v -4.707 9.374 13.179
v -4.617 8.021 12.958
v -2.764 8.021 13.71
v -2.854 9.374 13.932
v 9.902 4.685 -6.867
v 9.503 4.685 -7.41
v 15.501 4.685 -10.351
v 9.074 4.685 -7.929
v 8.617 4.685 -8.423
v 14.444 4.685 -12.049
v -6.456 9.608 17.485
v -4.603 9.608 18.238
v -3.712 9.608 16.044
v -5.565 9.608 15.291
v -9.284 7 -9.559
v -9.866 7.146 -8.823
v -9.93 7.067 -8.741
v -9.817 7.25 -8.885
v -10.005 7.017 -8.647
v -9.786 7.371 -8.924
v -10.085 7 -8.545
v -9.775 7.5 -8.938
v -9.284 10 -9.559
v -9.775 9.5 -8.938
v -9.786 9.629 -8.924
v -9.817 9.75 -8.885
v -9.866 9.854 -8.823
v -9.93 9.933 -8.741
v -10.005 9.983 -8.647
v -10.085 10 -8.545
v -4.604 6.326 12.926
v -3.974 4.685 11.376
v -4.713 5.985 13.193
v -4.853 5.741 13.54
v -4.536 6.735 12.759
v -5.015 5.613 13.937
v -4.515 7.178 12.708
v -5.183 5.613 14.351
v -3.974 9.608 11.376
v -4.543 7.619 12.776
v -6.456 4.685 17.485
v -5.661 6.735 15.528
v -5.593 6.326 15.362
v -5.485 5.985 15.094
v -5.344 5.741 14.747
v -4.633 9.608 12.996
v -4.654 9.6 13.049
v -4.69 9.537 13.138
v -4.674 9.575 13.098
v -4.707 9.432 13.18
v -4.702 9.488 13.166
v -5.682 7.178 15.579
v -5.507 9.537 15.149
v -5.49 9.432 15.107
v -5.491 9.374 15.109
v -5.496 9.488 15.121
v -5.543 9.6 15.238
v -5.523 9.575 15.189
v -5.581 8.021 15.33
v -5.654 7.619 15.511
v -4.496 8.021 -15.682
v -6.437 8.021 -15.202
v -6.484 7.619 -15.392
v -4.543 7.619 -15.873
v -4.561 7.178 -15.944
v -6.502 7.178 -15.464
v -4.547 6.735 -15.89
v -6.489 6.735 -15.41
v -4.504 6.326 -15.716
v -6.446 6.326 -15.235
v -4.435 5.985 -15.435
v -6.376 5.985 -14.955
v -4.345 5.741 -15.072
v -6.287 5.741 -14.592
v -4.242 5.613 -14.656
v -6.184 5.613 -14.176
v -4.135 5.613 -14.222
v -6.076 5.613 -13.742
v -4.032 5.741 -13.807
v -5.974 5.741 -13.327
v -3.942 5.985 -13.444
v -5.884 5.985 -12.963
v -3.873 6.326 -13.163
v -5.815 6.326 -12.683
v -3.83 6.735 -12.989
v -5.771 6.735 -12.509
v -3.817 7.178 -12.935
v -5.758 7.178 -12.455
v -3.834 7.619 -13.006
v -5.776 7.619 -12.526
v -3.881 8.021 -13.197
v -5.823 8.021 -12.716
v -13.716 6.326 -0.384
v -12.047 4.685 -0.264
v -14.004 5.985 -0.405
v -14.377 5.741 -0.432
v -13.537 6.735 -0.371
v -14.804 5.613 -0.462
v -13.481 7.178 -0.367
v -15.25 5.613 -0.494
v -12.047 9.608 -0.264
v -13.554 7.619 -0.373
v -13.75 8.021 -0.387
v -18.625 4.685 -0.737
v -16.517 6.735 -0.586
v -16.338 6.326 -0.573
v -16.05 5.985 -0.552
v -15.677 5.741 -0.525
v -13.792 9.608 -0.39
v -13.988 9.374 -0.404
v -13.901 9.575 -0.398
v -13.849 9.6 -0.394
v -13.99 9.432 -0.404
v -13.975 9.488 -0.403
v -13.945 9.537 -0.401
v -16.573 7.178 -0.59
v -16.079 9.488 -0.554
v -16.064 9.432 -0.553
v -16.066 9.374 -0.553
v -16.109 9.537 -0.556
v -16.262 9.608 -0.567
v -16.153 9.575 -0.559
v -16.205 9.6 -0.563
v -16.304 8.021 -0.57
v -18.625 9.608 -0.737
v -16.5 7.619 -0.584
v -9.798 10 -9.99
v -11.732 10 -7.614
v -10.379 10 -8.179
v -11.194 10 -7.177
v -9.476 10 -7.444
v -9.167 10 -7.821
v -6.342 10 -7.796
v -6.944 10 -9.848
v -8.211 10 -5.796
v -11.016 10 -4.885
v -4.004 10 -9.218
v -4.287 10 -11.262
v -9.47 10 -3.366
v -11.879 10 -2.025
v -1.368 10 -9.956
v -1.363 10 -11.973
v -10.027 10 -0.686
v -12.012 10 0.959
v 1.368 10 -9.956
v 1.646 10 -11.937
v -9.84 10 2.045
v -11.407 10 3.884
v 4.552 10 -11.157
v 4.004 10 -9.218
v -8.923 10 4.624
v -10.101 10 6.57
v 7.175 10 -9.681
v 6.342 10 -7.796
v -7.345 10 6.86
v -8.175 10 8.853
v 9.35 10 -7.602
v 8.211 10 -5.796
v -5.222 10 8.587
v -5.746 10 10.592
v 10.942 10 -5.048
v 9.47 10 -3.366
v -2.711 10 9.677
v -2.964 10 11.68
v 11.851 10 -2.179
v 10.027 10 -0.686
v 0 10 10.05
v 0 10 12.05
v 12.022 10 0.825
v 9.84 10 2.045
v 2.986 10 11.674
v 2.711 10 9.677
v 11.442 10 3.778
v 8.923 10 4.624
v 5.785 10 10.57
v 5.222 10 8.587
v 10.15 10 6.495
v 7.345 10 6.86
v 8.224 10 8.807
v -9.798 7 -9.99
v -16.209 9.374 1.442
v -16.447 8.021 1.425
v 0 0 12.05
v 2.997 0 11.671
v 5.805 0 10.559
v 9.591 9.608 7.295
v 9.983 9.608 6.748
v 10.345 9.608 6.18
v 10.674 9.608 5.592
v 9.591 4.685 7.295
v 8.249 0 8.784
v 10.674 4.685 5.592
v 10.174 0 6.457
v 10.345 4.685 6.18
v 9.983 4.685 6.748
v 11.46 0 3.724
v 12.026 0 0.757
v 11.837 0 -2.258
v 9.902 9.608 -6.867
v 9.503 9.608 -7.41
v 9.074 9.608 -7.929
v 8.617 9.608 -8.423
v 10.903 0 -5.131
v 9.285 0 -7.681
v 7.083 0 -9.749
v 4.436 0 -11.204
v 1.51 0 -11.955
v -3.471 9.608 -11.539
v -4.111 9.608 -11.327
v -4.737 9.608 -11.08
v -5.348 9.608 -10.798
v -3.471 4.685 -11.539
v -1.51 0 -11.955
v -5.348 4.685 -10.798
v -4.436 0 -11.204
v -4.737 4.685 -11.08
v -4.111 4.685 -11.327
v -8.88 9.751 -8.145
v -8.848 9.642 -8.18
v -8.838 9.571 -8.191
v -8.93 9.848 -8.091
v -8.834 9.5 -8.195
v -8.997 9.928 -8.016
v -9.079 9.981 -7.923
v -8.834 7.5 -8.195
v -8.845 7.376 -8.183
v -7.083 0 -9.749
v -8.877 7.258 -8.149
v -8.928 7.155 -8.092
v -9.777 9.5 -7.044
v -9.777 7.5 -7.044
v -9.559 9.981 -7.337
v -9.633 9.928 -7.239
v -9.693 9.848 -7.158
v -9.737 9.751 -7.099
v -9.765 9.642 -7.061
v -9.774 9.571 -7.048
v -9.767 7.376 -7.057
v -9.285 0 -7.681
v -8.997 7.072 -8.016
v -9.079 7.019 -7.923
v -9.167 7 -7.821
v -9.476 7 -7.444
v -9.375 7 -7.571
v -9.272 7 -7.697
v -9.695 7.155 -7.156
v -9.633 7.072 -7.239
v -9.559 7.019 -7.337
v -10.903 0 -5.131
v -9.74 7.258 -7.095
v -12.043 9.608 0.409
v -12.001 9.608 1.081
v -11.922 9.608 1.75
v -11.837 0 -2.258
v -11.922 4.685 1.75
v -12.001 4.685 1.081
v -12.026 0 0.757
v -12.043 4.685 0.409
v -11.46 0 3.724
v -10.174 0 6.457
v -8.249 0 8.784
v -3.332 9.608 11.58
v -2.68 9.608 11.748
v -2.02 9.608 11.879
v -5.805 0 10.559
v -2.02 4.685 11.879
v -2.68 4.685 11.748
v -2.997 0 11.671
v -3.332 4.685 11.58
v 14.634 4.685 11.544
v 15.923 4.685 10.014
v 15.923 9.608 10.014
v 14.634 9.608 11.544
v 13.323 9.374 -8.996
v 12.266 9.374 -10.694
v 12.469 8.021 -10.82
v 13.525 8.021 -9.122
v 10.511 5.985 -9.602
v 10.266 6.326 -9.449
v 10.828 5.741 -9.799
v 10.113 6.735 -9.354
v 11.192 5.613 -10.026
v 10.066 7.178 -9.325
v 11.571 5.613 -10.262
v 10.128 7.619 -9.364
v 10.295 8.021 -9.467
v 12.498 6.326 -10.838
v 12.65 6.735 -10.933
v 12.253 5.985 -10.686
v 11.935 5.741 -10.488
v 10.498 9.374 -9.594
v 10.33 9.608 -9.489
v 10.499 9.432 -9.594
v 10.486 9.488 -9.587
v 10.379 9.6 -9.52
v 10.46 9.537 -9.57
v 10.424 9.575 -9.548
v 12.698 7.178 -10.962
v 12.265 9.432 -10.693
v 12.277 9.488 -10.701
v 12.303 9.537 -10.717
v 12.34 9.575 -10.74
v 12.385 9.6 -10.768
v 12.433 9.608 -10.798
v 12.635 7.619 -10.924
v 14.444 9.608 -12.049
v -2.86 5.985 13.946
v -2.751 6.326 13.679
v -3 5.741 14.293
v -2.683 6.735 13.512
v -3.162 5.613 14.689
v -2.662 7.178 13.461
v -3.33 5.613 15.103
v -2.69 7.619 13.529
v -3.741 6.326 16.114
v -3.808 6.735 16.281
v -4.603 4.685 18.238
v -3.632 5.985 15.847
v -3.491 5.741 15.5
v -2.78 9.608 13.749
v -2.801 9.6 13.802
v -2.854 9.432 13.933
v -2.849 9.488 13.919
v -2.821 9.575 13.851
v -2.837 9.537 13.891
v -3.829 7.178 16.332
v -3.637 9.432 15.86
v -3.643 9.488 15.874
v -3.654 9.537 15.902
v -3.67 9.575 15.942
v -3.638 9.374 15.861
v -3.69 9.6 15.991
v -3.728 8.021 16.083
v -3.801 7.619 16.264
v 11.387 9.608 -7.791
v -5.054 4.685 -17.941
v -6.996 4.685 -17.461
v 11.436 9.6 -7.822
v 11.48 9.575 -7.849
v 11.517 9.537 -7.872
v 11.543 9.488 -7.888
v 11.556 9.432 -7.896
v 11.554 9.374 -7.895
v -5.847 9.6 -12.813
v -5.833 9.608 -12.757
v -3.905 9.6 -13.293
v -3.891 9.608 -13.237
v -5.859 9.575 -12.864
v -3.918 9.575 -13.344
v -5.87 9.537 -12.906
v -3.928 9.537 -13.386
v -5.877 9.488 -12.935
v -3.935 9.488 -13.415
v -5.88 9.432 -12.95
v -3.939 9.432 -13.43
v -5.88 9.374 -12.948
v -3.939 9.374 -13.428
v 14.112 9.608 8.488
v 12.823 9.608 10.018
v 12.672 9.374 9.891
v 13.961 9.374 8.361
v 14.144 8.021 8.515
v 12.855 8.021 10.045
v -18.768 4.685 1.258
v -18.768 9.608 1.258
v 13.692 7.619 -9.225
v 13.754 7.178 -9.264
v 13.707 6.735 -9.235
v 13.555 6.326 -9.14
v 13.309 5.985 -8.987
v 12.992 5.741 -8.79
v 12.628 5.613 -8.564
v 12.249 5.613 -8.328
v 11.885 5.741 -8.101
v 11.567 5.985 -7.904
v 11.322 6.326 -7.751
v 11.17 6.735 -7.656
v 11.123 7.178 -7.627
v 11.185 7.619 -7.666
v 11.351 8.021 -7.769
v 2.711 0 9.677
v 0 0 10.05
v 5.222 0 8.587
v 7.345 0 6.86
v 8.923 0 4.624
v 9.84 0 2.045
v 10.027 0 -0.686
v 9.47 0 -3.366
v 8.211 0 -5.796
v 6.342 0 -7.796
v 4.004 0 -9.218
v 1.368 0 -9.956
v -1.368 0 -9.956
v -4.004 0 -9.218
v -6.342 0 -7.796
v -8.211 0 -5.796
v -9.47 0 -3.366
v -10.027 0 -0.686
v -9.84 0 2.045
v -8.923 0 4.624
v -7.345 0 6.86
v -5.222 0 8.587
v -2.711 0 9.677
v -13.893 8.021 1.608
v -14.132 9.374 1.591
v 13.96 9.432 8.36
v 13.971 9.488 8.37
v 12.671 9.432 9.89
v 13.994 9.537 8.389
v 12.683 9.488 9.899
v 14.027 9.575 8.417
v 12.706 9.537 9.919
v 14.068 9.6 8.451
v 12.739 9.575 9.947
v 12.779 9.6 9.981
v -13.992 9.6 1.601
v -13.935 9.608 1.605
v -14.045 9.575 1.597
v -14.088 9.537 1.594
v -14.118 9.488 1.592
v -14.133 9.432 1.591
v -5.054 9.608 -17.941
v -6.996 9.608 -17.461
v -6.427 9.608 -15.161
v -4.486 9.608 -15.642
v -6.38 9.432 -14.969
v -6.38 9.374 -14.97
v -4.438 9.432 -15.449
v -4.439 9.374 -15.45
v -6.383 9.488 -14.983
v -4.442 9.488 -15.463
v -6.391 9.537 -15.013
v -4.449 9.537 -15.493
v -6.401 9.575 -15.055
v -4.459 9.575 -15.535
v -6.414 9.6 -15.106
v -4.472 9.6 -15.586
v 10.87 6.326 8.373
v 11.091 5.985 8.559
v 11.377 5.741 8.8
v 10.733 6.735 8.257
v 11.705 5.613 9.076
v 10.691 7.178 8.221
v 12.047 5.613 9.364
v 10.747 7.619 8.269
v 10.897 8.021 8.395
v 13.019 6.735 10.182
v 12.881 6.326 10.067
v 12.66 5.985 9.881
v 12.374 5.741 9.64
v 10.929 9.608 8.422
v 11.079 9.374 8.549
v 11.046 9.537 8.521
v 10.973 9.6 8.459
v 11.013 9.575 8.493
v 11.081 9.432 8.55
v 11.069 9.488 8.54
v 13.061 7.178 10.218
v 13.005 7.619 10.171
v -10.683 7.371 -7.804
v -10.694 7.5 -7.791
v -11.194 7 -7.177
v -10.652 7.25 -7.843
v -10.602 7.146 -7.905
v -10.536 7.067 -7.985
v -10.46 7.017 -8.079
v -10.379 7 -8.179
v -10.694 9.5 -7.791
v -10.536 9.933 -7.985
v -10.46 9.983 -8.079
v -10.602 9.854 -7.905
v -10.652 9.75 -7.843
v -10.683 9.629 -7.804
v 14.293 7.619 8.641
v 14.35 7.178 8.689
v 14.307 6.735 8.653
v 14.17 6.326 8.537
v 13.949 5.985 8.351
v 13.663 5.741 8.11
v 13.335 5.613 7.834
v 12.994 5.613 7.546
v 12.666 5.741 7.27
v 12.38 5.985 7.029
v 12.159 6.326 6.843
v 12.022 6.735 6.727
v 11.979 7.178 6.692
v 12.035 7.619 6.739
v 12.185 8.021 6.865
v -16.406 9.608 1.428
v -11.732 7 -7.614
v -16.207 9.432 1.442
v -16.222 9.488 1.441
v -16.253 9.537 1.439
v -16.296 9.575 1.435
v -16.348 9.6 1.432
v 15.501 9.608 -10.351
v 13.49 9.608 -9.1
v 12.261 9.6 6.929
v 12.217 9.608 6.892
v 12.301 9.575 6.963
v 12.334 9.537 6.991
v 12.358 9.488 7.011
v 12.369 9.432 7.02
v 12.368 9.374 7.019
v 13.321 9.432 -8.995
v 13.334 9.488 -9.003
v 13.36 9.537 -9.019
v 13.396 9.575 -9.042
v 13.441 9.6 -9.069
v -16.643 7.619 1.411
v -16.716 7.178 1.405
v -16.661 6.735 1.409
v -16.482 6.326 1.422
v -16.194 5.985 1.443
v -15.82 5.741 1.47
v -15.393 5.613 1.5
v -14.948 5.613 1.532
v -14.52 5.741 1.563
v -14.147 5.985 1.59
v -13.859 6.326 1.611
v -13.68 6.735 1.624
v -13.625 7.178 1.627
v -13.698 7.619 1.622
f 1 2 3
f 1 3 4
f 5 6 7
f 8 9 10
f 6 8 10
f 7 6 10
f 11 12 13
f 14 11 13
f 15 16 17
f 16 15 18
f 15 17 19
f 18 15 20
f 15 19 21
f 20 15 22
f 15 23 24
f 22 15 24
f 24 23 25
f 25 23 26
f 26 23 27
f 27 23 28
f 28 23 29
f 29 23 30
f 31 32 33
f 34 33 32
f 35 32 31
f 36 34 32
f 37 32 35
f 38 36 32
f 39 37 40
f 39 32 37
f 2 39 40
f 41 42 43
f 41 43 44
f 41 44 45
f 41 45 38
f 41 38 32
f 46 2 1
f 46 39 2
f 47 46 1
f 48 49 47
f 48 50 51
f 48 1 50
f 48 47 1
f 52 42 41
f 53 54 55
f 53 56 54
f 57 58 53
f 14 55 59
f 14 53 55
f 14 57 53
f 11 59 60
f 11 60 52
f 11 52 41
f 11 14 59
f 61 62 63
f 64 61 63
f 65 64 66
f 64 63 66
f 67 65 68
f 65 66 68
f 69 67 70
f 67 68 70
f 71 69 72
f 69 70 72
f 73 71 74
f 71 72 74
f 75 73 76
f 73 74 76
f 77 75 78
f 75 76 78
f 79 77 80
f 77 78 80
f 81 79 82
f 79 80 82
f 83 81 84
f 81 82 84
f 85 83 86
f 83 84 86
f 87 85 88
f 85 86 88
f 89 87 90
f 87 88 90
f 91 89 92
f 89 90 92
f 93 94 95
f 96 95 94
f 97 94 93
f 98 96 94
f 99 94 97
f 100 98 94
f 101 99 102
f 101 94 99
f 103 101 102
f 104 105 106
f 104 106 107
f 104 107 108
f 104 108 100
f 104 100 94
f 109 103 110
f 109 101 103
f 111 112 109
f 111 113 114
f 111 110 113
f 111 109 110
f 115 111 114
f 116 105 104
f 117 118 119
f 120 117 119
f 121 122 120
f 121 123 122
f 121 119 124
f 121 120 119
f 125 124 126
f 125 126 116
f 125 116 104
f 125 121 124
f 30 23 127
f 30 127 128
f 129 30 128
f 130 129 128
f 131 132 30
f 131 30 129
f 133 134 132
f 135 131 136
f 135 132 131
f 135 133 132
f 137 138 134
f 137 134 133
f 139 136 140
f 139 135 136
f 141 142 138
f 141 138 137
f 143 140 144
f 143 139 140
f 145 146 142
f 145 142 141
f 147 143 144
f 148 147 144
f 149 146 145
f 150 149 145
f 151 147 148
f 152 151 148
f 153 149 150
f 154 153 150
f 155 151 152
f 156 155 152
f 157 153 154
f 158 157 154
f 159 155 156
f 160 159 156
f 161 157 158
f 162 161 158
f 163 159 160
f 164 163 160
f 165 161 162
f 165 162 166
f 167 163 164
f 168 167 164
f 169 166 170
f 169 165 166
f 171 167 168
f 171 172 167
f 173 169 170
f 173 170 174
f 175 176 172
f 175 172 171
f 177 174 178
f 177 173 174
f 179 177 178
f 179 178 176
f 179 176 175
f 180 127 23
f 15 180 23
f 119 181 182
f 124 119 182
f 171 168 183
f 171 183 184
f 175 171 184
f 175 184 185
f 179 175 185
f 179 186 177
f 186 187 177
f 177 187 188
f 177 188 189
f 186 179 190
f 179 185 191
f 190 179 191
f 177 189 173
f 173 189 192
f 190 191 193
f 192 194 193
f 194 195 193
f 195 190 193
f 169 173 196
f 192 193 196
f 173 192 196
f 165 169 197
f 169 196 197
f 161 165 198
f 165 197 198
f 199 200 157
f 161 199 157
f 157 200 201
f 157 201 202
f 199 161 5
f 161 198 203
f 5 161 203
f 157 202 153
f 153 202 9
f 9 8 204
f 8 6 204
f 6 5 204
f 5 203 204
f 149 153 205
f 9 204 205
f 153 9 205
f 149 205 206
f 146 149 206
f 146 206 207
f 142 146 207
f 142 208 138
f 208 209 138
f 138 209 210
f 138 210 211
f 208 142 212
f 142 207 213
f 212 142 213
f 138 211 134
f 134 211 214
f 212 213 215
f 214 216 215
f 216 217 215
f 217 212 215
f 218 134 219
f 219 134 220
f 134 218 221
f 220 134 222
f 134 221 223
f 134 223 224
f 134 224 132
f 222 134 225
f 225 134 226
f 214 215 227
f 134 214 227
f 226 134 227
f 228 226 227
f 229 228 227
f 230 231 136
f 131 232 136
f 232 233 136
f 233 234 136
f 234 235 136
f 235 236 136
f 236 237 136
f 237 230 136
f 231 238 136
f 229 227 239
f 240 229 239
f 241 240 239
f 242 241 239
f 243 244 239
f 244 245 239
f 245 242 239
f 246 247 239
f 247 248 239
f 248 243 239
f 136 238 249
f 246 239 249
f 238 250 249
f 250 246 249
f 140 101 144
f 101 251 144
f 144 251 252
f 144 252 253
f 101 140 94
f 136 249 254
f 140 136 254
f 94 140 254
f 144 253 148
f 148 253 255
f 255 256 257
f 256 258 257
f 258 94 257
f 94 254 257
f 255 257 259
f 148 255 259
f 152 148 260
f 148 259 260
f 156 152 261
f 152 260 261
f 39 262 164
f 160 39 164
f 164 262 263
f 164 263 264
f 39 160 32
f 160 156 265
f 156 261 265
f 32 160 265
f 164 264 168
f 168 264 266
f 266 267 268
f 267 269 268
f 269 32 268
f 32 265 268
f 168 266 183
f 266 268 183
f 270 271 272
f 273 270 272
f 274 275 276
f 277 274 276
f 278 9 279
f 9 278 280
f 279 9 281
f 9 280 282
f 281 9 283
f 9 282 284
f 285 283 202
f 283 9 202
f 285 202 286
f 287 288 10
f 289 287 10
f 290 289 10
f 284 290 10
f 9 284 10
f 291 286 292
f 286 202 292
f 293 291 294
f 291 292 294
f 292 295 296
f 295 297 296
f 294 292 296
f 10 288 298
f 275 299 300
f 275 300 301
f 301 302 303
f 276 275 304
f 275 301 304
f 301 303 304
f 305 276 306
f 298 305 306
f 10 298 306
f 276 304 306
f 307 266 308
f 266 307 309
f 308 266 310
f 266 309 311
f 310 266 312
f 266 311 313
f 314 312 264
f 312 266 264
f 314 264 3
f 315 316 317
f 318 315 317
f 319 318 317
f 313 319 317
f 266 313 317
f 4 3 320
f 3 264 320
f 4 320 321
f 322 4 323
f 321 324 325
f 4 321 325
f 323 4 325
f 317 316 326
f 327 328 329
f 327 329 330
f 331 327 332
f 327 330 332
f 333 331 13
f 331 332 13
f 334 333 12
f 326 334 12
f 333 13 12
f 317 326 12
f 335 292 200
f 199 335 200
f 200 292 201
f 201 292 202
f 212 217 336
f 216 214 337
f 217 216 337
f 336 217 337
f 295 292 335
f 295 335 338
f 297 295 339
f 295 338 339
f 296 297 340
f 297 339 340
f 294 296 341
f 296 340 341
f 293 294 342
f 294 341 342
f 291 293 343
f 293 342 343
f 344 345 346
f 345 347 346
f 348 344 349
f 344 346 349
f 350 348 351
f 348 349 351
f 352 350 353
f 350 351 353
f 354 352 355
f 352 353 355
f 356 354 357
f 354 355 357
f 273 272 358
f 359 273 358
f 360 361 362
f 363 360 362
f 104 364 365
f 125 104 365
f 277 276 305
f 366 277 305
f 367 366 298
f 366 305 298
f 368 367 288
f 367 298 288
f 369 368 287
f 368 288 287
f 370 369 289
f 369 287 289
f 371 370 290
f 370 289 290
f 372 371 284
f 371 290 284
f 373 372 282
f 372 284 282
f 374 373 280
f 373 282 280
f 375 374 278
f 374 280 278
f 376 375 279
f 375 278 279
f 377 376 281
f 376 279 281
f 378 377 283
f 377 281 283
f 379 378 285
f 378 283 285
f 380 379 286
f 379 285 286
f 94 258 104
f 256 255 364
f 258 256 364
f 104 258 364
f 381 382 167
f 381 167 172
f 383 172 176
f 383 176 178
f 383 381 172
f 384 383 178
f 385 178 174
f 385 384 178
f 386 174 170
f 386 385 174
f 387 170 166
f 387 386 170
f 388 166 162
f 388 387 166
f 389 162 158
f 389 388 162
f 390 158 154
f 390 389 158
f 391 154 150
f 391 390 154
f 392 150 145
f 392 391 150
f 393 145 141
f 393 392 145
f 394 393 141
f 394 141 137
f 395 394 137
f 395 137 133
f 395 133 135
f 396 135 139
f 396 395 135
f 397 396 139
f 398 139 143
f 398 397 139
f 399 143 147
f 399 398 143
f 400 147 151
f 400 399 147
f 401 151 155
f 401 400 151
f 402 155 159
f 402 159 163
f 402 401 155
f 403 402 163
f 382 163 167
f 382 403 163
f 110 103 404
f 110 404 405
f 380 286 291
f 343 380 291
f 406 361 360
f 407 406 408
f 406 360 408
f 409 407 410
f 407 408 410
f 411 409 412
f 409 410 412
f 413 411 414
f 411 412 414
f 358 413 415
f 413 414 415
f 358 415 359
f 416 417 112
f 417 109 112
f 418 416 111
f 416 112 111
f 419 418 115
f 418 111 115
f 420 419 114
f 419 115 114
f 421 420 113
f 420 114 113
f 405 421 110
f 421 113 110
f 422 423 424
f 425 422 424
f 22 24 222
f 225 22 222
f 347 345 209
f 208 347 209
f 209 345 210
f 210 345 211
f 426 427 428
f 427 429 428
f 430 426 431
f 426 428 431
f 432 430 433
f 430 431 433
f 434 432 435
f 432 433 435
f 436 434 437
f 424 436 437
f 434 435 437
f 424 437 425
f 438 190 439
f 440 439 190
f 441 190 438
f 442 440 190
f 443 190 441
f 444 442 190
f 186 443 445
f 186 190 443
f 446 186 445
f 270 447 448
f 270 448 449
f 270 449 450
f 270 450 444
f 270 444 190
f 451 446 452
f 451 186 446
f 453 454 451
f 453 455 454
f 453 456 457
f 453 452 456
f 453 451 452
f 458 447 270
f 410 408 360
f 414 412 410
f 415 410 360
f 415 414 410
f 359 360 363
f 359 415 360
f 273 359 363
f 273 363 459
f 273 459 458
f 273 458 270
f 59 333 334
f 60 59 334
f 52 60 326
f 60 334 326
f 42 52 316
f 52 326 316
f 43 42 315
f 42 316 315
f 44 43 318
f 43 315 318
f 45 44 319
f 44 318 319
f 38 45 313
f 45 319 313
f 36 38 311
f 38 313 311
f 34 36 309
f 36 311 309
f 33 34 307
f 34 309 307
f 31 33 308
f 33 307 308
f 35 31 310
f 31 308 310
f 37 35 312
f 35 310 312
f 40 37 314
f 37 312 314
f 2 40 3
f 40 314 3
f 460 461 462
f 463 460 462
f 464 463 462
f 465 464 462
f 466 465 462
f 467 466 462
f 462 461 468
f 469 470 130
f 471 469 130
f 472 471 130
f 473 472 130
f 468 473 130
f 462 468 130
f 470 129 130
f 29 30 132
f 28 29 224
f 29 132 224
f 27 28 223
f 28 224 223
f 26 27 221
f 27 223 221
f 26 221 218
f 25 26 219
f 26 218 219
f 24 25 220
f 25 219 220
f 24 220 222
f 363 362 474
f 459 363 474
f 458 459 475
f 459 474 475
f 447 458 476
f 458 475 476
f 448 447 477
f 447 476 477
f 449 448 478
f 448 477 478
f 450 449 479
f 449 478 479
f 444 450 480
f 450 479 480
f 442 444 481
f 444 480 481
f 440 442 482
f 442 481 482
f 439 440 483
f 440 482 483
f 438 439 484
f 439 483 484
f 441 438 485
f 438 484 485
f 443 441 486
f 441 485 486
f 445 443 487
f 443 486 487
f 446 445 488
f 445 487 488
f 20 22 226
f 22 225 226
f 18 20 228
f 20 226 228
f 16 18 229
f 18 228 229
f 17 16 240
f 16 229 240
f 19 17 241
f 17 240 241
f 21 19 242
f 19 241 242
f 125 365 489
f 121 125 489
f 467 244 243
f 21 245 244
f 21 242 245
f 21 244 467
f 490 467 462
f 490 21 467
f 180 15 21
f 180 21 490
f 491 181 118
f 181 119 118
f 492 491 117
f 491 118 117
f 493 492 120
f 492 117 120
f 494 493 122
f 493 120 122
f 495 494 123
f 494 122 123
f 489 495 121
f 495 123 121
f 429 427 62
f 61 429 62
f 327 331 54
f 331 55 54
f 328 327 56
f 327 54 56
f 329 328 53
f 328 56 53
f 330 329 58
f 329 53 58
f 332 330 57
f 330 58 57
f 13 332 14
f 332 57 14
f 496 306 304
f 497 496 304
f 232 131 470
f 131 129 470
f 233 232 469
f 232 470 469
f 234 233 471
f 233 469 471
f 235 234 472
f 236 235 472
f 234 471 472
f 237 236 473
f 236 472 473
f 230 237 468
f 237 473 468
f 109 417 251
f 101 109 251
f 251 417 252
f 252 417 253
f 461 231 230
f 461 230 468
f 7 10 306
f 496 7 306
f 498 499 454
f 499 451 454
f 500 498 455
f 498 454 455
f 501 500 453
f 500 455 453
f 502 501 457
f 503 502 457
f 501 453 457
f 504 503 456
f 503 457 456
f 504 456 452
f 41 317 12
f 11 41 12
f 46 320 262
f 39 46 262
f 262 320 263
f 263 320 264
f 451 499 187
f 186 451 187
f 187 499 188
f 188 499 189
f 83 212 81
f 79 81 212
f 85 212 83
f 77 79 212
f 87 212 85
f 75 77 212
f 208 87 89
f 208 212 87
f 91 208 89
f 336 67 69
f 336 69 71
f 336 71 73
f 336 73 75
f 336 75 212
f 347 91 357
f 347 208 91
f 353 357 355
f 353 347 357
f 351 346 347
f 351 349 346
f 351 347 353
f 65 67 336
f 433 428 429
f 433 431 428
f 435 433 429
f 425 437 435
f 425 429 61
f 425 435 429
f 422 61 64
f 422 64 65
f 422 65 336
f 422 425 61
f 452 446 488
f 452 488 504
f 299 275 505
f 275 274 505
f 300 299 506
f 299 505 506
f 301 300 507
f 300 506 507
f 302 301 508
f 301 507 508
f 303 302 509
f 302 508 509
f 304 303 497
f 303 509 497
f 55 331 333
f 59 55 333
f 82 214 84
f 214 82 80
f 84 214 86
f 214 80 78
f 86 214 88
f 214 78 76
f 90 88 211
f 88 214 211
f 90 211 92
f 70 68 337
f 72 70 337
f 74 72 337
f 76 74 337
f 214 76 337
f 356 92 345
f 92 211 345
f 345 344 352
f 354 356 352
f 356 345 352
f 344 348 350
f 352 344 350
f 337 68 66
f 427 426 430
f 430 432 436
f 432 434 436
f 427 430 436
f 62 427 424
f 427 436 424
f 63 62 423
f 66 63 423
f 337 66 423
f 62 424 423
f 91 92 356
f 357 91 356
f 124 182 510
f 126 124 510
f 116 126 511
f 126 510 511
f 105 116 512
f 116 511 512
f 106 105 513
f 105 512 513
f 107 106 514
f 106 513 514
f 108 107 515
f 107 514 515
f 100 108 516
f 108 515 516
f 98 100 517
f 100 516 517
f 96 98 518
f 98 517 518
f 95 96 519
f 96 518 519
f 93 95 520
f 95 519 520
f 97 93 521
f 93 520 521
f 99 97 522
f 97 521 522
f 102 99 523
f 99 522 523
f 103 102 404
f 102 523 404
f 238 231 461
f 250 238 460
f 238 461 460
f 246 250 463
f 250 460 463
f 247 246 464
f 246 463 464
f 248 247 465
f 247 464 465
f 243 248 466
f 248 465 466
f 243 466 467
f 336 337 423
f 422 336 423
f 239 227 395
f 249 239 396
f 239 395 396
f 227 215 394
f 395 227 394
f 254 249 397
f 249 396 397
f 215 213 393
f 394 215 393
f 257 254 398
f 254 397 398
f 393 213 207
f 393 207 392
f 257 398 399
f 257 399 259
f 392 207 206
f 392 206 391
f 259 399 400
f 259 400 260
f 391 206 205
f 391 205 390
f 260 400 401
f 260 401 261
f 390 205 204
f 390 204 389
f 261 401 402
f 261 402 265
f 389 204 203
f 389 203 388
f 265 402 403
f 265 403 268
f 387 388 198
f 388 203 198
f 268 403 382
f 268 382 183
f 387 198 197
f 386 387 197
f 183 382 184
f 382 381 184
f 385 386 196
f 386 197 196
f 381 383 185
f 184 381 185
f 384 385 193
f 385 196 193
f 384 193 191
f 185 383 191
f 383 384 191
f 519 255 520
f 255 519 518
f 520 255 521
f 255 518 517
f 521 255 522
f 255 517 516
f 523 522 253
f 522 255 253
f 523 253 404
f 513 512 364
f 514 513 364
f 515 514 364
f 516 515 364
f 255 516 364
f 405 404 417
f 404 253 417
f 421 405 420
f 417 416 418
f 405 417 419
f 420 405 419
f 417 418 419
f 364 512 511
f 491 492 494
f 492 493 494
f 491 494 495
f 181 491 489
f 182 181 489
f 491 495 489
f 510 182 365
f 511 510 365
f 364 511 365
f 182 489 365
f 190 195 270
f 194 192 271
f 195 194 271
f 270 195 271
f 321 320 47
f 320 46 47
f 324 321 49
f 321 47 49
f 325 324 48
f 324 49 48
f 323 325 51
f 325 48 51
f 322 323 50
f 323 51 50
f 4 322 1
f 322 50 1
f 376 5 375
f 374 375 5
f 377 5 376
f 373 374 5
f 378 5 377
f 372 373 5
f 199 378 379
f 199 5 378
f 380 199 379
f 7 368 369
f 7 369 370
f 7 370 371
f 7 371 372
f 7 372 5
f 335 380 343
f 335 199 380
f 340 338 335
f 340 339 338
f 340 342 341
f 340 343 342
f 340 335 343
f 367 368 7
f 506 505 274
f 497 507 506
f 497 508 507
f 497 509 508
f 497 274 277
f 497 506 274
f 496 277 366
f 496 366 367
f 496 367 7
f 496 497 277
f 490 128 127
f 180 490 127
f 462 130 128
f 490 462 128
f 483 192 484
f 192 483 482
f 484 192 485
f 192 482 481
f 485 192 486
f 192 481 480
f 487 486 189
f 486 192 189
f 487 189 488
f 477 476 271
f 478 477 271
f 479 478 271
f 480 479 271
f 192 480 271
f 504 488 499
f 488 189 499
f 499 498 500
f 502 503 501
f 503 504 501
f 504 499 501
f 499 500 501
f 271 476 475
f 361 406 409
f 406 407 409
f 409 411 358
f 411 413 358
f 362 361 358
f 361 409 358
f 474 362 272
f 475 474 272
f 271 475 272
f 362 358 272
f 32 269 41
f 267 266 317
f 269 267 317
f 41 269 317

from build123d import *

# Parameters (mm, degrees)
ESQUISSE1_R                      = 12.05
ESQUISSE1_R_2                    = 10.05
BASE_DEPTH                       = 10
BOSS_TIGE_DEPTH                  = 2
CONGE_TIGE_R                     = 0.2
REP_SUPPORT_TIGE_COUNT           = 5
CONGE_TIGE_OF_REP_SUPPORT_TIGE_R = 0.2
BOSS_EXTRU_1_DEPTH               = 3
CONG_1_R                         = 0.5


with BuildPart() as part:
    # Esquisse1 → BASE (new body)
    with BuildSketch(Plane(origin=(0, 0, 0), x_dir=(1, 0, 0), z_dir=(0, 1, 0))):
        Circle(ESQUISSE1_R)
        Circle(ESQUISSE1_R_2, mode=Mode.SUBTRACT)
    extrude(amount=BASE_DEPTH)

    # Esquisse7 → BOSS TIGE (add)
    with BuildSketch(Plane(origin=(-2.523980967, 0, 0.624115435), x_dir=(-0.2400443980205285, -8.560907231219602e-15, -0.9707619105522024), z_dir=(0.9707619105522023, 0, -0.24004439802052846))):
        with BuildLine():
            Line((14.022631891, 9.608391049), (11.415742159, 9.608391049))
            Line((11.415742159, 9.608391049), (11.415742159, 4.685414017))
            Line((11.415742159, 4.685414017), (18.629521623, 4.685414017))
            Line((18.629521623, 4.685414017), (18.629521623, 9.608391049))
            Line((18.629521623, 9.608391049), (16.022631891, 9.608391049))
            Line((16.022631891, 9.608391049), (16.302913172, 8.020618644))
            ThreePointArc((16.302913172, 8.020618644), (15.022631891, 5.596902533), (13.742350611, 8.020618644))
            Line((13.742350611, 8.020618644), (14.022631891, 9.608391049))
        make_face()
    boss_tige = extrude(amount=BOSS_TIGE_DEPTH)

    # CONGE TIGE
    conge_tige_edges = [part.edges().sort_by_distance(p)[0] for p in [
        (-5.399362084, 9.608391049, -15.17008971),
        (-4.919273288, 9.608391049, -13.228565889),
    ]]
    fillet(conge_tige_edges, radius=CONGE_TIGE_R)

    # REP SUPPORT TIGE: BOSS TIGE ×5 about axis
    rep_support_tige_axis = Axis((0, 10, 0), (0, -1, 0))
    for i in range(1, REP_SUPPORT_TIGE_COUNT):
        add(boss_tige.rotate(rep_support_tige_axis, i * 360 / REP_SUPPORT_TIGE_COUNT))

    # CONGE TIGE of REP SUPPORT TIGE
    conge_tige_of_rep_support_tige_edges = [part.edges().sort_by_distance(p)[0] for p in [
        (12.759118029, 9.608391049, -9.82291402),
        (11.060974744, 9.608391049, -8.766358587),
        (13.284930692, 9.608391049, 9.099194977),
        (11.755331628, 9.608391049, 7.810658325),
        (-4.548579323, 9.608391049, 15.446525786),
        (-3.795780249, 9.608391049, 13.593610906),
        (-16.096107314, 9.608391049, 0.447282967),
        (-14.101252836, 9.608391049, 0.590655245),
    ]]
    fillet(conge_tige_of_rep_support_tige_edges, radius=CONGE_TIGE_OF_REP_SUPPORT_TIGE_R)

    # Esquisse8 → Boss.-Extru.1 (add)
    with BuildSketch(Plane(origin=(0, 10, 0), x_dir=(1, 0, 0), z_dir=(0, 1, 0))):
        with BuildLine():
            Line((-8.268421395, 8.757415667), (-7.703456323, 8.300627196))
            ThreePointArc((-7.703456323, 8.300627196), (-8.759173713, 7.17778009), (-9.652653966, 5.92198637))
            Line((-9.652653966, 5.92198637), (-10.190441919, 6.359674812))
            Line((-10.190441919, 6.359674812), (-9.690340196, 6.974149988))
            Line((-9.690340196, 6.974149988), (-10.694246531, 7.791197297))
            Line((-10.694246531, 7.791197297), (-11.194348255, 7.176722121))
            Line((-11.194348255, 7.176722121), (-11.732136208, 7.614410563))
            Line((-11.732136208, 7.614410563), (-9.79837654, 9.990421794))
            Line((-9.79837654, 9.990421794), (-9.28435206, 9.559462499))
            Line((-9.28435206, 9.559462499), (-9.775272229, 8.937627422))
            Line((-9.775272229, 8.937627422), (-8.759341564, 8.13558059))
            Line((-8.759341564, 8.13558059), (-8.268421395, 8.757415667))
        make_face()
    extrude(amount=-BOSS_EXTRU_1_DEPTH)

    # Congé1
    cong_1_edges = [part.edges().sort_by_distance(p)[0] for p in [
        (-10.235385675, 7, -7.417745099),
        (-9.304844667, 7, -8.566238952),
        (-9.304844667, 10, -8.566238952),
        (-10.235385675, 10, -7.417745099),
    ]]
    fillet(cong_1_edges, radius=CONG_1_R)


solid = part.part
